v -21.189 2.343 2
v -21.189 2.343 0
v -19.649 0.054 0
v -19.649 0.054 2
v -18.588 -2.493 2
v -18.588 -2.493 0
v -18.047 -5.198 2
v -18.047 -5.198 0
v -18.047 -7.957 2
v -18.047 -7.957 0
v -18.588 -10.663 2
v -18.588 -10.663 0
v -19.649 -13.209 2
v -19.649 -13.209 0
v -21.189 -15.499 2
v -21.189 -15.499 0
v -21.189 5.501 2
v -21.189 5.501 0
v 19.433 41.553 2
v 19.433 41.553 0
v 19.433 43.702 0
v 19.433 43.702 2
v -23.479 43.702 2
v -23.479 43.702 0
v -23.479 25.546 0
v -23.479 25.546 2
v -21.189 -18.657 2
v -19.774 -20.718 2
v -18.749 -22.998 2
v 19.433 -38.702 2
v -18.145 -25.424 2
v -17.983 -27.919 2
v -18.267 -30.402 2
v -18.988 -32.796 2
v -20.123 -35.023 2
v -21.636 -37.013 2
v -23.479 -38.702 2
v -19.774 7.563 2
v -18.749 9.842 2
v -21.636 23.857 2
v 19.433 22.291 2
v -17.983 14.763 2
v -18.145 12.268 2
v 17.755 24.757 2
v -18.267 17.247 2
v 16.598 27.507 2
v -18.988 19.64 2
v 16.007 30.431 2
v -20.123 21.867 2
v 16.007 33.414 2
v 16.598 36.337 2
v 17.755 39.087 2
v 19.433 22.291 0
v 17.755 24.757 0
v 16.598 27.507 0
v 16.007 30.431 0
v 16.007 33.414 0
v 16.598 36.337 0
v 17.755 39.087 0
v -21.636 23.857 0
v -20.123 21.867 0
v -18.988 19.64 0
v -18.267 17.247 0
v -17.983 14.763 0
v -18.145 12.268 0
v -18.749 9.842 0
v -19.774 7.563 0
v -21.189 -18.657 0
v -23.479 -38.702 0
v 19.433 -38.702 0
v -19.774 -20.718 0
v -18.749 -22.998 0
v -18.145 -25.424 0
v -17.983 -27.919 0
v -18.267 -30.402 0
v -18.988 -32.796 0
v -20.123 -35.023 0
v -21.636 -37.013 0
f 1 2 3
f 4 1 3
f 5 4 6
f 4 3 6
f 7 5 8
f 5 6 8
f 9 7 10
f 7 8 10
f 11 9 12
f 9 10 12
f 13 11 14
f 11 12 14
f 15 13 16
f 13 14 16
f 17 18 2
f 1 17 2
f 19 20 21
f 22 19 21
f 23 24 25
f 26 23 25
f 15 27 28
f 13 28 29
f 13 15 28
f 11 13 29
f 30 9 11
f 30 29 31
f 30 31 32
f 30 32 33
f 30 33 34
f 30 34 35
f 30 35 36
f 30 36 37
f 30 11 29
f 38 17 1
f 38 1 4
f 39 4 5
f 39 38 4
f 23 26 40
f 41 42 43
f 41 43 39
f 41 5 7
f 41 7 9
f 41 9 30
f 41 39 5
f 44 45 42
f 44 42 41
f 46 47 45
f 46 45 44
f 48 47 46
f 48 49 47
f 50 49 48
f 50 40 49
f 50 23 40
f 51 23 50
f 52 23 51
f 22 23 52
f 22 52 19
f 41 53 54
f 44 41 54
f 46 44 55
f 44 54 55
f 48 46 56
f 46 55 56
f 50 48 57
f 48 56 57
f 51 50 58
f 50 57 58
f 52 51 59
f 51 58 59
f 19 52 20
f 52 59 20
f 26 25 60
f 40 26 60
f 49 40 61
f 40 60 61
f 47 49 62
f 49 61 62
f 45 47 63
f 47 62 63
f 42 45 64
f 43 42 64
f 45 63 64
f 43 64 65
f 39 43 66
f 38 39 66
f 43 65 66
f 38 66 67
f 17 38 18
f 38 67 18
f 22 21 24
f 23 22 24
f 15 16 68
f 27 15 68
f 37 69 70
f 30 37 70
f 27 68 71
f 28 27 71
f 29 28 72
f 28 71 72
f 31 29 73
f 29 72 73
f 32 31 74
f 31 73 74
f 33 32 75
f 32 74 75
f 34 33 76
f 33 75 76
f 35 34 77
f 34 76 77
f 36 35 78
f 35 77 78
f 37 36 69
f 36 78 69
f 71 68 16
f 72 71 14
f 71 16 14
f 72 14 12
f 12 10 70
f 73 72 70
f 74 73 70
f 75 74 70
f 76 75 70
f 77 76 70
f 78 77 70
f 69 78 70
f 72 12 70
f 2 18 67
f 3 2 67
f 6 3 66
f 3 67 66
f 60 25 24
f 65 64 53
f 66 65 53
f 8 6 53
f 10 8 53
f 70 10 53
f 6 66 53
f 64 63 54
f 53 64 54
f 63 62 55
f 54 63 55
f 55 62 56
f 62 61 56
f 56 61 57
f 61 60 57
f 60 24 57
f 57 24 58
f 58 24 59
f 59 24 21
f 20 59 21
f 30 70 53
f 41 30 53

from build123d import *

# Parameters (mm, degrees)
F1_DEPTH = 2


with BuildPart() as f1:
    # F0 (on Top) → F1 (new body)
    with BuildSketch(Plane.XY):
        with BuildLine():
            Line((19.433085, 43.702438), (-23.47875, 43.702438))
            Line((-23.47875, 43.702438), (-23.47875, 25.546357))
            ThreePointArc((-23.47875, 25.546357), (-18.069214, 16.011021), (-21.1889, 5.501345))
            Line((-21.1889, 5.501345), (-21.1889, 2.342773))
            ThreePointArc((-21.1889, 2.342773), (-17.97875, -6.577941), (-21.1889, -15.498655))
            Line((-21.1889, -15.498655), (-21.1889, -18.657227))
            ThreePointArc((-21.1889, -18.657227), (-18.069214, -29.166902), (-23.47875, -38.702238))
            Line((-23.47875, -38.702238), (19.433085, -38.702238))
            Line((19.433085, -38.702238), (19.433085, 22.291379))
            ThreePointArc((19.433085, 22.291379), (15.933085, 31.922059), (19.433085, 41.55274))
            Line((19.433085, 41.55274), (19.433085, 43.702438))
        make_face()
    extrude(amount=F1_DEPTH)


solid = f1.part
